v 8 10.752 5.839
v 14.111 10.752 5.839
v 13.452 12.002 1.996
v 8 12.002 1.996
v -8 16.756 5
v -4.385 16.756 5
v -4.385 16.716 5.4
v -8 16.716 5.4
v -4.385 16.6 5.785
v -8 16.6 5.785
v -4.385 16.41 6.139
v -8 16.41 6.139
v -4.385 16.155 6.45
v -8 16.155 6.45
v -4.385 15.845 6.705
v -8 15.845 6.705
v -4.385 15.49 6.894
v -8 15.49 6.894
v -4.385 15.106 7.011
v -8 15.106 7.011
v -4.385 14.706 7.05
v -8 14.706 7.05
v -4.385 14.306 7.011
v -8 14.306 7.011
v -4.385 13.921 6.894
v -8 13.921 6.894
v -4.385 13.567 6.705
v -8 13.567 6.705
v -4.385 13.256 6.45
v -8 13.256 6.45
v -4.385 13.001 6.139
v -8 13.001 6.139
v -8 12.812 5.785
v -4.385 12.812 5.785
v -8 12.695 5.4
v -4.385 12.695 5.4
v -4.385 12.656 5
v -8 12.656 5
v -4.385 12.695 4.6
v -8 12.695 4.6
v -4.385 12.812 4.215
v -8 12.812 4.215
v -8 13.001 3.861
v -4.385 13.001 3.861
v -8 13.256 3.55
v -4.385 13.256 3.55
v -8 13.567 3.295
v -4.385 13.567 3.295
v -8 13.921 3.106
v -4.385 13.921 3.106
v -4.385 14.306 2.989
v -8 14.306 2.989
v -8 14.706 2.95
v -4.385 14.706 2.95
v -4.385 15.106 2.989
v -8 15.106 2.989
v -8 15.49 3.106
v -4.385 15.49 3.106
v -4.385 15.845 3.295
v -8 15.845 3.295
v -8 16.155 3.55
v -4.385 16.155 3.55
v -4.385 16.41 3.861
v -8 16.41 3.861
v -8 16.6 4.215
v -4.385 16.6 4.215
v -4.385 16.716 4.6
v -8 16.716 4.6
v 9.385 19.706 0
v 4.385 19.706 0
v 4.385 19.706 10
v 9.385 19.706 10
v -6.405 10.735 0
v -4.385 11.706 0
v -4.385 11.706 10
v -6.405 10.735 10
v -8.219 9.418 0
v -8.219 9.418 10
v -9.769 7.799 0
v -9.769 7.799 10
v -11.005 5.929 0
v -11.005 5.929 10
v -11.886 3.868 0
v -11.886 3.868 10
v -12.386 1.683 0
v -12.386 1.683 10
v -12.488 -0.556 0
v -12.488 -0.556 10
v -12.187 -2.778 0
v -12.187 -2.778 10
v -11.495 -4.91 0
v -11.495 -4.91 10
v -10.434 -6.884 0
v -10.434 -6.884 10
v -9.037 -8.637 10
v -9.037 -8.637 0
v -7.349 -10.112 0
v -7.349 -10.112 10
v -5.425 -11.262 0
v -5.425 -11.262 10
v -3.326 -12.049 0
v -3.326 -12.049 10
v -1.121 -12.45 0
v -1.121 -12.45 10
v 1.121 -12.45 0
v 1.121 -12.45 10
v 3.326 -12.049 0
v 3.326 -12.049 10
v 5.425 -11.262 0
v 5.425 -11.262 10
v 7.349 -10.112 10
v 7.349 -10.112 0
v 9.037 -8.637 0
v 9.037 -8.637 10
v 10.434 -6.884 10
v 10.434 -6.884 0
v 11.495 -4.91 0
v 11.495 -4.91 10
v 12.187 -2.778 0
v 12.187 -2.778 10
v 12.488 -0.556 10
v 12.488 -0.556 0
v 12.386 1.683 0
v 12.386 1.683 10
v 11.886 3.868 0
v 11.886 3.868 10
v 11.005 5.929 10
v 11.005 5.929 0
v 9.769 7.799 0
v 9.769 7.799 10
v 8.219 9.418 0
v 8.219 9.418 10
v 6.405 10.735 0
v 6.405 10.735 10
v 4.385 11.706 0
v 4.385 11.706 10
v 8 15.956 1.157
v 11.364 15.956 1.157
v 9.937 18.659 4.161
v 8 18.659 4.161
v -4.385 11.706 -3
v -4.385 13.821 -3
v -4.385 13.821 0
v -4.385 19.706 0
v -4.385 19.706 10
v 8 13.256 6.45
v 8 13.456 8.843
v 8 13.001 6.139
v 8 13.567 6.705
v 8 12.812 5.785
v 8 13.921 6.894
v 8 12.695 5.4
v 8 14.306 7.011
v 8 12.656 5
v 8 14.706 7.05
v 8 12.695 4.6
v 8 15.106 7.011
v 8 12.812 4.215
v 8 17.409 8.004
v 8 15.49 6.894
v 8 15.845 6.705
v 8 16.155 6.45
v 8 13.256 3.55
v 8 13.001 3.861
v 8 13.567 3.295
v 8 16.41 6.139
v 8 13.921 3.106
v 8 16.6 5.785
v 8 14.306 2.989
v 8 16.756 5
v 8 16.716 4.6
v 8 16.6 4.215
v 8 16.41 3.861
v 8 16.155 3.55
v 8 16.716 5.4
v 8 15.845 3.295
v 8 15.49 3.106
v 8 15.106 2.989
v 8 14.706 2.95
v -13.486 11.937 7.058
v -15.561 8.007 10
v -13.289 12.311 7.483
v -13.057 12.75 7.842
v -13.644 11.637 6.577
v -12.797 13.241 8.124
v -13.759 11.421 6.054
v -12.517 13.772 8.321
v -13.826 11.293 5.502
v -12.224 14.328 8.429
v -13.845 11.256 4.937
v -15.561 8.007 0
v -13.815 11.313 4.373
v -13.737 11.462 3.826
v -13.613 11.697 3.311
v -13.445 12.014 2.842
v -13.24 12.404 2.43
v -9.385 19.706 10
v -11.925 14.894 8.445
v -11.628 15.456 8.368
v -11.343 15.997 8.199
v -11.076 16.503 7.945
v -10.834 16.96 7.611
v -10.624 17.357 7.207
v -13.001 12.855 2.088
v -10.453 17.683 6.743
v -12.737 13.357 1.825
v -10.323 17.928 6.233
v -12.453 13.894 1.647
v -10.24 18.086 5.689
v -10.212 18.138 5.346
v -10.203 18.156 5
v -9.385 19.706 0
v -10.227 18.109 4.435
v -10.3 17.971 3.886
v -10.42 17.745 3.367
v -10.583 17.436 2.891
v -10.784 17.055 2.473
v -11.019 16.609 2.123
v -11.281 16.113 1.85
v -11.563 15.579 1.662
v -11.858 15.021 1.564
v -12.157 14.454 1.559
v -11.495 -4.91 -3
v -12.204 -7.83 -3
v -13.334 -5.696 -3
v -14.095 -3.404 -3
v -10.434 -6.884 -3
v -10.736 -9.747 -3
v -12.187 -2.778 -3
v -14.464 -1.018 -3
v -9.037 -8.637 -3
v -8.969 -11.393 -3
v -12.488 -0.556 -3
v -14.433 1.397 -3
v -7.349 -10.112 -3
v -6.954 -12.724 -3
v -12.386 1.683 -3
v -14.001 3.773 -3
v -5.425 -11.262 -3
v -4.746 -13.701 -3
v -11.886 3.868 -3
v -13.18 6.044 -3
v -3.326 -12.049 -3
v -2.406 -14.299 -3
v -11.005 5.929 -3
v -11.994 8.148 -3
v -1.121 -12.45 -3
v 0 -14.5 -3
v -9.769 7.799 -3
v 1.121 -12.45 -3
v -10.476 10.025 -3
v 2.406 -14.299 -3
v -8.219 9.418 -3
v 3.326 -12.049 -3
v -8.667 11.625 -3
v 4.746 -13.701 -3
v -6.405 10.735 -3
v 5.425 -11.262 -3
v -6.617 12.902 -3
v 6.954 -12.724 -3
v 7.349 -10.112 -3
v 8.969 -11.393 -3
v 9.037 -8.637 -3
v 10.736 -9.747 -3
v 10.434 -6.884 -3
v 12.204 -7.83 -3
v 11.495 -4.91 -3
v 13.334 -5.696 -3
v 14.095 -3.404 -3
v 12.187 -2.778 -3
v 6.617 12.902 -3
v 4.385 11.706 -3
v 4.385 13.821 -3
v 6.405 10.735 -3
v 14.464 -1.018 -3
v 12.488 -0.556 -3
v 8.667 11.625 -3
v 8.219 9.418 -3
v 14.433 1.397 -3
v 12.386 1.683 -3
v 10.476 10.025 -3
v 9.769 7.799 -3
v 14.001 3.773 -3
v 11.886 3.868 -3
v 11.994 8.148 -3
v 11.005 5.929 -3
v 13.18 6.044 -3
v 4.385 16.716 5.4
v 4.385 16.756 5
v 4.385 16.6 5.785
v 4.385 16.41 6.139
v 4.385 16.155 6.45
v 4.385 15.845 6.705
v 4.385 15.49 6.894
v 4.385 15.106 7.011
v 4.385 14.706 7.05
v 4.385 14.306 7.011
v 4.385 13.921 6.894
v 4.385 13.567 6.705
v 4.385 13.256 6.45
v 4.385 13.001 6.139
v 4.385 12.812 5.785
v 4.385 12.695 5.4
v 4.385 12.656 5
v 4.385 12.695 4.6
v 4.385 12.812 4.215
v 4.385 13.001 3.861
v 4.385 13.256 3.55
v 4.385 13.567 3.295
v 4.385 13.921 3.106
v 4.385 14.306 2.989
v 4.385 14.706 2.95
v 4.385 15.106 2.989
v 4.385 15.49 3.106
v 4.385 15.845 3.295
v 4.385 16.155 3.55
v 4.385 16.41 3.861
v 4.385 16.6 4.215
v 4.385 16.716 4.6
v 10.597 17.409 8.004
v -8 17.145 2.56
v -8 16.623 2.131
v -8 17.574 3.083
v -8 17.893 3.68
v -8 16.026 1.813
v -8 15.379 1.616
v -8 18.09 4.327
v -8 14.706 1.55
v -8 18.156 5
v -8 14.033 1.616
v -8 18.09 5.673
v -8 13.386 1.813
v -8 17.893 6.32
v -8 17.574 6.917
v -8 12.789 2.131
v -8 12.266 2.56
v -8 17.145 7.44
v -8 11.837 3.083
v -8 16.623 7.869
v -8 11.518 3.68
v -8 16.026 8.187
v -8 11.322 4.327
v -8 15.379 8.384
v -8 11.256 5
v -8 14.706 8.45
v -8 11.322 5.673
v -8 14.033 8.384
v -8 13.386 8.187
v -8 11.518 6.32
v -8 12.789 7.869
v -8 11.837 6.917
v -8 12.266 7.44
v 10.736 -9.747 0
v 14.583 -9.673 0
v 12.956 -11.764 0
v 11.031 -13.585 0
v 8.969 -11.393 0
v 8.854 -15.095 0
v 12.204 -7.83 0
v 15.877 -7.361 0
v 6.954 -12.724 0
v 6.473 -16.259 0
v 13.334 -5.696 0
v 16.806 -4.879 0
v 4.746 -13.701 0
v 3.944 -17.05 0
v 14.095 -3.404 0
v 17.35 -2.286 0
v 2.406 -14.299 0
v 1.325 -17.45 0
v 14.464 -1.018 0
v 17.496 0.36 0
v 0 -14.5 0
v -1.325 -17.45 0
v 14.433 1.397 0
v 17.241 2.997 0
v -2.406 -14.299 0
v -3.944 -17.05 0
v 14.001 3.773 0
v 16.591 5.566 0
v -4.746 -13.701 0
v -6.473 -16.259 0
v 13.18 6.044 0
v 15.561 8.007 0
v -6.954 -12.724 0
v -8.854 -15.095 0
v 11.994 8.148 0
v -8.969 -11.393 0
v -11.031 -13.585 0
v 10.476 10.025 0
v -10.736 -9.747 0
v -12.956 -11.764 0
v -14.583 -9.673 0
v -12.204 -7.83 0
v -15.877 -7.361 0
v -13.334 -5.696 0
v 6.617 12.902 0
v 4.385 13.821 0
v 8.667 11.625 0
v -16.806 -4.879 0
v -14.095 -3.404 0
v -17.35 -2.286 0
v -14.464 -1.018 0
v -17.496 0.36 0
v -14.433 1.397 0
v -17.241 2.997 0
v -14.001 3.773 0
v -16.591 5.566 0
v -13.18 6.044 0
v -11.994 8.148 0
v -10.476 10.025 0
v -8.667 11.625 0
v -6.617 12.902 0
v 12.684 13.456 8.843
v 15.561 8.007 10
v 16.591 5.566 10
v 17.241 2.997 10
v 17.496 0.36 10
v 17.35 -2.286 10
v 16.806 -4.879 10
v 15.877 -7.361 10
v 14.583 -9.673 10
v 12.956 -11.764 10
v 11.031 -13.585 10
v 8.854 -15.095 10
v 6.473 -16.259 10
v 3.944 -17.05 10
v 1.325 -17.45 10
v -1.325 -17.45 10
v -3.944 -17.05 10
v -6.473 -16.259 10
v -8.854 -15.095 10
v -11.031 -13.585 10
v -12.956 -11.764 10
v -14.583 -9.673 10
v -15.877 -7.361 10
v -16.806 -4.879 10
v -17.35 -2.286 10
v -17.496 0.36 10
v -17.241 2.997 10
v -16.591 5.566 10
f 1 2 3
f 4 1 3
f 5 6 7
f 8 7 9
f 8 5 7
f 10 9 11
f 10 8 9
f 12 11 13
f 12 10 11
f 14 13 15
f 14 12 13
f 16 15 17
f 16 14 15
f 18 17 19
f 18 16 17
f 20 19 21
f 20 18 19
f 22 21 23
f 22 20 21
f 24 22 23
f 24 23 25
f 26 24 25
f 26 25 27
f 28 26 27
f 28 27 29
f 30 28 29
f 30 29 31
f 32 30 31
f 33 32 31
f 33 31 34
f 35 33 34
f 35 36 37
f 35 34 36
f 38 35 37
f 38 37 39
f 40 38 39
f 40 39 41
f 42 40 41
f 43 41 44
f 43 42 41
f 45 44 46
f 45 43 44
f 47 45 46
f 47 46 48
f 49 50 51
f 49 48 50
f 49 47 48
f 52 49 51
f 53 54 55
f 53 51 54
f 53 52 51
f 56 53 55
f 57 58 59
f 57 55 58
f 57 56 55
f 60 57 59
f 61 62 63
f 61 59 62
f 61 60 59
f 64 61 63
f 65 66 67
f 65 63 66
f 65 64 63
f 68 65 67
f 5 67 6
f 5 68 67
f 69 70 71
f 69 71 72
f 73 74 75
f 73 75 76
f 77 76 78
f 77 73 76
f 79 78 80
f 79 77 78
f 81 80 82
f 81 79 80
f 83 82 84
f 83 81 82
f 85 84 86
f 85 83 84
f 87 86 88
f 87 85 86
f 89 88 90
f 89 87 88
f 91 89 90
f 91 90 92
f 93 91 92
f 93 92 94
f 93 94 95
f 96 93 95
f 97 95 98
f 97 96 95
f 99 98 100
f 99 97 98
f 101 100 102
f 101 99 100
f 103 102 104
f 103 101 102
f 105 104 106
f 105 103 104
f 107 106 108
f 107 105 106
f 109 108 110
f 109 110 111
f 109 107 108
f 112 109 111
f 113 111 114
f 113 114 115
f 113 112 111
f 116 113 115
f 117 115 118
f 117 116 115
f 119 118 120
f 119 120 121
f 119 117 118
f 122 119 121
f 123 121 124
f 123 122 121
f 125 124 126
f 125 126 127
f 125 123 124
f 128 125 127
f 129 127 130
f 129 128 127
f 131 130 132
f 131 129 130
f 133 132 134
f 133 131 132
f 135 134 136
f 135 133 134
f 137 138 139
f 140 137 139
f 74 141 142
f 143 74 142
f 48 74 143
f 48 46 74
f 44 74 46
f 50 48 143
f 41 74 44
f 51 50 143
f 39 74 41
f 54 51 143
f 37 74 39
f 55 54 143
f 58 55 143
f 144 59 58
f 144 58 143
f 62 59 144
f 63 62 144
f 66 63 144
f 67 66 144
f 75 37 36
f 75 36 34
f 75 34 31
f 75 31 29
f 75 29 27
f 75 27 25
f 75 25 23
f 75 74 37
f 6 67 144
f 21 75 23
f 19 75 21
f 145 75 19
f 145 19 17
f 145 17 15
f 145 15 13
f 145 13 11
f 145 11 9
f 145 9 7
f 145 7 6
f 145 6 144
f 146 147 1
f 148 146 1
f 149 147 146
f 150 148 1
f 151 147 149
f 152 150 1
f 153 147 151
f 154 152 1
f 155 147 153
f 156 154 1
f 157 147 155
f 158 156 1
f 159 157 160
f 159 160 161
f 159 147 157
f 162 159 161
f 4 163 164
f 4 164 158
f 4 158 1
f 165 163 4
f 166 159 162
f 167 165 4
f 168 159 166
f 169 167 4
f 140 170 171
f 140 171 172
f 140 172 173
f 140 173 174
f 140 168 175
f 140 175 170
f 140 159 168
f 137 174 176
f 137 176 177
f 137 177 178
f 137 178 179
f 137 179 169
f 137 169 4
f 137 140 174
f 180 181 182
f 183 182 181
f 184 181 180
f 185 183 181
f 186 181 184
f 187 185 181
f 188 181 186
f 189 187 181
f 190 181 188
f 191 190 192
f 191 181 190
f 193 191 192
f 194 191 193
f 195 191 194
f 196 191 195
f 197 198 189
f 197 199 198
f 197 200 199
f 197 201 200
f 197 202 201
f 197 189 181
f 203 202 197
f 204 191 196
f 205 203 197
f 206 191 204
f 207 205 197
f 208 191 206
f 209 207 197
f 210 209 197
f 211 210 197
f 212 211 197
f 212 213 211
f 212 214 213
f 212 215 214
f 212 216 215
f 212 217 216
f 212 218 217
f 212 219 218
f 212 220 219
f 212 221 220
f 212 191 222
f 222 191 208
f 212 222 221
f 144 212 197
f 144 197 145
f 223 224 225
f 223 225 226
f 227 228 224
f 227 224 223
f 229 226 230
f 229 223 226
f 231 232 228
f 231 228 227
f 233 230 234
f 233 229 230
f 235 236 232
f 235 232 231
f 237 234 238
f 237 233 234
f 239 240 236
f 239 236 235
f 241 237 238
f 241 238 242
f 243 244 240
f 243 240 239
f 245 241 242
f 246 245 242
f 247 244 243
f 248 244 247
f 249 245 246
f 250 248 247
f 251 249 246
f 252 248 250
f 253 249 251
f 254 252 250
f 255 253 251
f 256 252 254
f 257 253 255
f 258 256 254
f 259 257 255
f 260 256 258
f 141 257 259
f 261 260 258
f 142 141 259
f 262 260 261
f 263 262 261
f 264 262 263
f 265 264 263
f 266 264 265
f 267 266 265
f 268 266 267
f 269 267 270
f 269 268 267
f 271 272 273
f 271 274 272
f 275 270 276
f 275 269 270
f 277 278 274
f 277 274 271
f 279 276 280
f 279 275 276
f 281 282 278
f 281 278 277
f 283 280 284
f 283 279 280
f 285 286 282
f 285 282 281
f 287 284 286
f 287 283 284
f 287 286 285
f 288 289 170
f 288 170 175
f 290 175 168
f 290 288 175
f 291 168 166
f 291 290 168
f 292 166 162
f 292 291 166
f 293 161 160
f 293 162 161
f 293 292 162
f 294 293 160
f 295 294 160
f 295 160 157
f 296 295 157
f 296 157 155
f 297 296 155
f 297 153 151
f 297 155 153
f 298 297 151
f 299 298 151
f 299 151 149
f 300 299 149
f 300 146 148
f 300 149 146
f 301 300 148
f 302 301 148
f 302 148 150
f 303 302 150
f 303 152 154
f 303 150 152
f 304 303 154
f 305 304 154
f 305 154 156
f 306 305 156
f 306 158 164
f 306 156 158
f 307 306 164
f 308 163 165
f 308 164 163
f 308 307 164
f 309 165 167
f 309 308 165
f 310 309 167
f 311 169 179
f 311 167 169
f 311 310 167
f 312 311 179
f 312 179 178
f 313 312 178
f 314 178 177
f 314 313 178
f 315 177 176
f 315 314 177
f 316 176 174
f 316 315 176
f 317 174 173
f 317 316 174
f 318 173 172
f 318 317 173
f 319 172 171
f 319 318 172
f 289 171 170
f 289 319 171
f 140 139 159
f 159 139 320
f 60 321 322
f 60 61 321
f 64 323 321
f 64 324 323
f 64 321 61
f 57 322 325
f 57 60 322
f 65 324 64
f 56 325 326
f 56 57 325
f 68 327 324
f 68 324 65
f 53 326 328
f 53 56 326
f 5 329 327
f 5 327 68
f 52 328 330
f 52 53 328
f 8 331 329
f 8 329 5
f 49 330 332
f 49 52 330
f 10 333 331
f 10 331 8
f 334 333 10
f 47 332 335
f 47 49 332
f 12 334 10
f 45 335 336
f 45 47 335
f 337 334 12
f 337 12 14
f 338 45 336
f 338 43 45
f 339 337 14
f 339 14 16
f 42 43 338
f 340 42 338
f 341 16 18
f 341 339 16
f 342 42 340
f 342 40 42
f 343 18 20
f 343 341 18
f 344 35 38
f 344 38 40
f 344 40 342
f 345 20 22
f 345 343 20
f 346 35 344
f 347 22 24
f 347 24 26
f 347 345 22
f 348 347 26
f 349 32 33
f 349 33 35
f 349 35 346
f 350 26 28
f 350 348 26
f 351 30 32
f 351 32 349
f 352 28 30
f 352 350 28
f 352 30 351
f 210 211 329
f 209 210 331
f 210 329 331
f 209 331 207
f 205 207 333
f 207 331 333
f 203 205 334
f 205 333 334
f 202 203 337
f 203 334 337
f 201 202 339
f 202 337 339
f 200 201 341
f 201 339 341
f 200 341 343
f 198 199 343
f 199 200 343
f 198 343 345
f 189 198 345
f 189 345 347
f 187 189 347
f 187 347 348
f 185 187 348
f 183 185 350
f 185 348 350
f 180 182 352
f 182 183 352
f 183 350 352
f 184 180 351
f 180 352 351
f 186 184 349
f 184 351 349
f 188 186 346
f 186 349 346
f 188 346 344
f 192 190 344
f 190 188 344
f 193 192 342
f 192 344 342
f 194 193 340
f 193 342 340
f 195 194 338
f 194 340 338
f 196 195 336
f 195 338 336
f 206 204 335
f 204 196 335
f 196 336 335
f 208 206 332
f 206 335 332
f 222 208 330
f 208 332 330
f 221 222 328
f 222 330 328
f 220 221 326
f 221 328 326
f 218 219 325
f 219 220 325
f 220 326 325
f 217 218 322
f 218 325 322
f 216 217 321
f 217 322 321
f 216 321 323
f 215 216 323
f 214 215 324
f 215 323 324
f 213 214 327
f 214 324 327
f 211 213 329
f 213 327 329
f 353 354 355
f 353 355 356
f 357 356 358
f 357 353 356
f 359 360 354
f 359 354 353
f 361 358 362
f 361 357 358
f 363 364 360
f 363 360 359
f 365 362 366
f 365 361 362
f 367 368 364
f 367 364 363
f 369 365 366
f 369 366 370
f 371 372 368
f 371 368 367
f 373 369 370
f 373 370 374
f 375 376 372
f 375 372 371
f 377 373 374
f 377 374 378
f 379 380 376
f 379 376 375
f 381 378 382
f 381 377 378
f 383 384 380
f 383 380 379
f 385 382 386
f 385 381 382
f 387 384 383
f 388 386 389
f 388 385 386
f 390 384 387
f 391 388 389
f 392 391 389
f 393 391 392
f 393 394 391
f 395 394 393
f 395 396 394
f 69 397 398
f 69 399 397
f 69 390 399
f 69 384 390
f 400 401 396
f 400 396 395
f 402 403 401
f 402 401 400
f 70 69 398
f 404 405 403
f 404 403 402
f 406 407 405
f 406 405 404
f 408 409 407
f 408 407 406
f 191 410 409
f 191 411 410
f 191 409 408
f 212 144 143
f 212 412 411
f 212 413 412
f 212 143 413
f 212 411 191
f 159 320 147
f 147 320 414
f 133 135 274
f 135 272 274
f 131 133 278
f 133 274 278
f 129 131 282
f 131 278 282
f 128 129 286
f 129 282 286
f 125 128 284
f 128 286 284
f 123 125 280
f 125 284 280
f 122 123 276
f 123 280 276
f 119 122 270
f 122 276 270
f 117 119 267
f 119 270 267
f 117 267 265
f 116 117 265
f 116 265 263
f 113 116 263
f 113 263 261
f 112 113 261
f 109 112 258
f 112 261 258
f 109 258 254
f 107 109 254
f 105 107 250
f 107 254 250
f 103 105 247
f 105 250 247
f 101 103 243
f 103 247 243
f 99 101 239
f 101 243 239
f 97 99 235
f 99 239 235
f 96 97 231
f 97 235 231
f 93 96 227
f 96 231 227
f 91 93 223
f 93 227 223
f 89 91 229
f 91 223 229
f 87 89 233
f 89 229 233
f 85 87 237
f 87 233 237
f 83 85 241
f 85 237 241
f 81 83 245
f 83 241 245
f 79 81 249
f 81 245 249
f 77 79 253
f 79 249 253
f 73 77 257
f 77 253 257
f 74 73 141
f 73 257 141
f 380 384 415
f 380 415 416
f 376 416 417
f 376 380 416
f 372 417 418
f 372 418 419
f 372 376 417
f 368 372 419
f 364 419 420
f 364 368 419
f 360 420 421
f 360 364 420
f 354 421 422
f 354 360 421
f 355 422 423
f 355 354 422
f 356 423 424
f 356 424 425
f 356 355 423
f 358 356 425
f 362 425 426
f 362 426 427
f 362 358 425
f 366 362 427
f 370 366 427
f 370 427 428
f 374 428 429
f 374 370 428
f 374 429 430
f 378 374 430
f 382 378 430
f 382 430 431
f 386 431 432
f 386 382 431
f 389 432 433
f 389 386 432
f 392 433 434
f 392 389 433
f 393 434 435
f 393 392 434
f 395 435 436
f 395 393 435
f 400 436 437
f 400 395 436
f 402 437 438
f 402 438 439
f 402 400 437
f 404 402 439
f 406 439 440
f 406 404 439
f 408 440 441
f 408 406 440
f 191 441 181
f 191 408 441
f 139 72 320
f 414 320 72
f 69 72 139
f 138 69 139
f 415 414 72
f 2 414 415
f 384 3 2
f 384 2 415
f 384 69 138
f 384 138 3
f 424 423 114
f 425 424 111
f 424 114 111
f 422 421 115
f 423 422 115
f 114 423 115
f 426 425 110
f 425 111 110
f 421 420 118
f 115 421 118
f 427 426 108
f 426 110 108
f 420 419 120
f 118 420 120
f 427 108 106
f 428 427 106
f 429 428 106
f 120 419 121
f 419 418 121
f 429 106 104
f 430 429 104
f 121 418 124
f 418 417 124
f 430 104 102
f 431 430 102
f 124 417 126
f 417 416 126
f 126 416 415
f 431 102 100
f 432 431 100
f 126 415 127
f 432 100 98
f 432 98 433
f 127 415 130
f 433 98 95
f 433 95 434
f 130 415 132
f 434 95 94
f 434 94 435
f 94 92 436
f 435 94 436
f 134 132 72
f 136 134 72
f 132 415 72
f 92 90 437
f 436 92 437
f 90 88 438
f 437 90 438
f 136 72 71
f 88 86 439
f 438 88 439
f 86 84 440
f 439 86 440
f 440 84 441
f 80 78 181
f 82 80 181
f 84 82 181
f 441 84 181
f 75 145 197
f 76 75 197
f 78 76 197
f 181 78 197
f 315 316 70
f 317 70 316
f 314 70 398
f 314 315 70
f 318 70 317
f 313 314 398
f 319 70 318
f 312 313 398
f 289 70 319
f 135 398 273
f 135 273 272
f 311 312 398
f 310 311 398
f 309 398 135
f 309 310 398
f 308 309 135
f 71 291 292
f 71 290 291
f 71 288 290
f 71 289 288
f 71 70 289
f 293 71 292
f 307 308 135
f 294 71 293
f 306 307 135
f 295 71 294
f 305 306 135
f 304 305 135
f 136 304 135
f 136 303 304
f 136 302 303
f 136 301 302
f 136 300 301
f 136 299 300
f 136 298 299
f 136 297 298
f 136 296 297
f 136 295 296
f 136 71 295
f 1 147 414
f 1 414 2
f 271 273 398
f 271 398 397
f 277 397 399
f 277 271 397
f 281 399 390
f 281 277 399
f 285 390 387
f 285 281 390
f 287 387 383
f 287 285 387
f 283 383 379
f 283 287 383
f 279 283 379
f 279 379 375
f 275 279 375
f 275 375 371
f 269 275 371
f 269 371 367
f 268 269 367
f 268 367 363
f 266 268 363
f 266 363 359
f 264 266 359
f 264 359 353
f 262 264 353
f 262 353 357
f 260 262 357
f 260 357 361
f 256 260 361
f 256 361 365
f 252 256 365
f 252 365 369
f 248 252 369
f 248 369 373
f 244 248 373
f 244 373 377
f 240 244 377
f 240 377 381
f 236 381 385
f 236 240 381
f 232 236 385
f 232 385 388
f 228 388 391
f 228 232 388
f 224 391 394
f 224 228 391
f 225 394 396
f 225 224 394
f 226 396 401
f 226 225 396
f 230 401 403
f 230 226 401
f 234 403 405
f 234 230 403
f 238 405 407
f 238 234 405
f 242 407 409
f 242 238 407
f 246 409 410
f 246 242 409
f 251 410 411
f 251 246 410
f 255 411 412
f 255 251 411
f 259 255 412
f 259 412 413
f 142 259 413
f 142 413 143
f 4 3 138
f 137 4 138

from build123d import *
from build123d.topology import SkipClean

# Parameters (mm, degrees)
BOSS_EXTRUDE1_DEPTH     = 10
CUT_EXTRUDE1_DEPTH      = 29.188093475
CUT_EXTRUDE1_DEPTH_BACK = 29.188093475
SKETCH4_R               = 2.05
CUT_EXTRUDE2_OUTLINE_W  = 1.4
CUT_EXTRUDE2_OUTLINE_H  = 5.870544518
CUT_EXTRUDE3_START      = 20
CUT_EXTRUDE3_DEPTH      = 12
BOSS_EXTRUDE2_START     = 3
SKETCH8_R               = 14.5
SKETCH8_R_2             = 12.5
BOSS_EXTRUDE2_DEPTH     = 3
CUT_EXTRUDE7_DEPTH      = 3


# Read off the part's stored shape, not the designer's step: Cut-Extrude2
with BuildPart() as part:
    # Sketch1 → Boss-Extrude1 (new body)
    with BuildSketch(Plane.XY):
        with BuildLine():
            Line((-15.560899439, 8.006772674), (-9.384542241, 19.705801525))
            Line((-9.384542241, 19.705801525), (-4.384542241, 19.705801525))
            Line((-4.384542241, 19.705801525), (-4.384542241, 16.705801525))
            Line((-4.384542241, 16.705801525), (-4.384542241, 11.705801525))
            ThreePointArc((-4.384542241, 11.705801525), (0, -12.5), (4.384542241, 11.705801525))
            Line((4.384542241, 11.705801525), (4.384542241, 16.705801525))
            Line((4.384542241, 16.705801525), (4.384542241, 19.705801525))
            Line((4.384542241, 19.705801525), (9.384542241, 19.705801525))
            Line((9.384542241, 19.705801525), (15.560899439, 8.006772674))
            ThreePointArc((15.560899439, 8.006772674), (0, -17.5), (-15.560899439, 8.006772674))
        make_face()
    extrude(amount=BOSS_EXTRUDE1_DEPTH)

    # Sketch4 → Cut-Extrude1 (cut, two sides: drawn at the far end of the back side and taken through both)
    with BuildSketch(Plane(origin=(0, 0, 0), x_dir=(0, 0, -1), z_dir=(1, 0, 0)).offset(-CUT_EXTRUDE1_DEPTH_BACK)):
        with Locations(Location((-5, 14.705801525, 0), (0, 0, 90))):
            Circle(SKETCH4_R)
    extrude(amount=CUT_EXTRUDE1_DEPTH + CUT_EXTRUDE1_DEPTH_BACK, mode=Mode.SUBTRACT)

    # Cut-Extrude2 outline → Cut-Extrude2 (revolve, cut)
    with BuildSketch(Plane(origin=(0, 14.705801525, 5), x_dir=(0, 1, 0), z_dir=(0, 0, -1))):
        with Locations((2.75, -10.935272259)):
            Rectangle(CUT_EXTRUDE2_OUTLINE_W, CUT_EXTRUDE2_OUTLINE_H)
    revolve(axis=Axis((0, 14.705801525, 5), (1, 0, 0)), mode=Mode.SUBTRACT)

    # Sketch6 → Cut-Extrude3 (cut)
    with BuildSketch(Plane(origin=(0, 0, 0), x_dir=(0, 0, -1), z_dir=(1, 0, 0)).offset(CUT_EXTRUDE3_START)):
        Polygon((-1.996012472, 12.00221275), (-1.156629675, 15.955536649), (-4.160617203, 18.659125424), (-8.003987528, 17.4093903), (-8.843370325, 13.456066401), (-5.839382797, 10.752477625), align=None)
    extrude(amount=-CUT_EXTRUDE3_DEPTH, mode=Mode.SUBTRACT)

    # Sketch8 → Boss-Extrude2 (add)
    with SkipClean():  # the faces are left unmerged after this step: merging them gives an invalid solid
        with BuildSketch(Plane(origin=(0, 0, 0), x_dir=(-1, 0, 0), z_dir=(0, 0, -1)).offset(BOSS_EXTRUDE2_START)):
            with Locations(Location((0, 0, 0), (0, 0, 107.600741317))):
                Circle(SKETCH8_R)
            Circle(SKETCH8_R_2, mode=Mode.SUBTRACT)
        extrude(amount=-BOSS_EXTRUDE2_DEPTH)

    # Sketch9 → Cut-Extrude7 (cut)
    with BuildSketch(Plane.XY):
        Polygon((-4.384542241, 11.705801525), (-4.384542241, 13.821207955), (0.563137908, 18.768888104), (4.384542241, 13.821207955), (4.384542241, 11.705801525), align=None)
    extrude(amount=-CUT_EXTRUDE7_DEPTH, mode=Mode.SUBTRACT)


solid = part.part
